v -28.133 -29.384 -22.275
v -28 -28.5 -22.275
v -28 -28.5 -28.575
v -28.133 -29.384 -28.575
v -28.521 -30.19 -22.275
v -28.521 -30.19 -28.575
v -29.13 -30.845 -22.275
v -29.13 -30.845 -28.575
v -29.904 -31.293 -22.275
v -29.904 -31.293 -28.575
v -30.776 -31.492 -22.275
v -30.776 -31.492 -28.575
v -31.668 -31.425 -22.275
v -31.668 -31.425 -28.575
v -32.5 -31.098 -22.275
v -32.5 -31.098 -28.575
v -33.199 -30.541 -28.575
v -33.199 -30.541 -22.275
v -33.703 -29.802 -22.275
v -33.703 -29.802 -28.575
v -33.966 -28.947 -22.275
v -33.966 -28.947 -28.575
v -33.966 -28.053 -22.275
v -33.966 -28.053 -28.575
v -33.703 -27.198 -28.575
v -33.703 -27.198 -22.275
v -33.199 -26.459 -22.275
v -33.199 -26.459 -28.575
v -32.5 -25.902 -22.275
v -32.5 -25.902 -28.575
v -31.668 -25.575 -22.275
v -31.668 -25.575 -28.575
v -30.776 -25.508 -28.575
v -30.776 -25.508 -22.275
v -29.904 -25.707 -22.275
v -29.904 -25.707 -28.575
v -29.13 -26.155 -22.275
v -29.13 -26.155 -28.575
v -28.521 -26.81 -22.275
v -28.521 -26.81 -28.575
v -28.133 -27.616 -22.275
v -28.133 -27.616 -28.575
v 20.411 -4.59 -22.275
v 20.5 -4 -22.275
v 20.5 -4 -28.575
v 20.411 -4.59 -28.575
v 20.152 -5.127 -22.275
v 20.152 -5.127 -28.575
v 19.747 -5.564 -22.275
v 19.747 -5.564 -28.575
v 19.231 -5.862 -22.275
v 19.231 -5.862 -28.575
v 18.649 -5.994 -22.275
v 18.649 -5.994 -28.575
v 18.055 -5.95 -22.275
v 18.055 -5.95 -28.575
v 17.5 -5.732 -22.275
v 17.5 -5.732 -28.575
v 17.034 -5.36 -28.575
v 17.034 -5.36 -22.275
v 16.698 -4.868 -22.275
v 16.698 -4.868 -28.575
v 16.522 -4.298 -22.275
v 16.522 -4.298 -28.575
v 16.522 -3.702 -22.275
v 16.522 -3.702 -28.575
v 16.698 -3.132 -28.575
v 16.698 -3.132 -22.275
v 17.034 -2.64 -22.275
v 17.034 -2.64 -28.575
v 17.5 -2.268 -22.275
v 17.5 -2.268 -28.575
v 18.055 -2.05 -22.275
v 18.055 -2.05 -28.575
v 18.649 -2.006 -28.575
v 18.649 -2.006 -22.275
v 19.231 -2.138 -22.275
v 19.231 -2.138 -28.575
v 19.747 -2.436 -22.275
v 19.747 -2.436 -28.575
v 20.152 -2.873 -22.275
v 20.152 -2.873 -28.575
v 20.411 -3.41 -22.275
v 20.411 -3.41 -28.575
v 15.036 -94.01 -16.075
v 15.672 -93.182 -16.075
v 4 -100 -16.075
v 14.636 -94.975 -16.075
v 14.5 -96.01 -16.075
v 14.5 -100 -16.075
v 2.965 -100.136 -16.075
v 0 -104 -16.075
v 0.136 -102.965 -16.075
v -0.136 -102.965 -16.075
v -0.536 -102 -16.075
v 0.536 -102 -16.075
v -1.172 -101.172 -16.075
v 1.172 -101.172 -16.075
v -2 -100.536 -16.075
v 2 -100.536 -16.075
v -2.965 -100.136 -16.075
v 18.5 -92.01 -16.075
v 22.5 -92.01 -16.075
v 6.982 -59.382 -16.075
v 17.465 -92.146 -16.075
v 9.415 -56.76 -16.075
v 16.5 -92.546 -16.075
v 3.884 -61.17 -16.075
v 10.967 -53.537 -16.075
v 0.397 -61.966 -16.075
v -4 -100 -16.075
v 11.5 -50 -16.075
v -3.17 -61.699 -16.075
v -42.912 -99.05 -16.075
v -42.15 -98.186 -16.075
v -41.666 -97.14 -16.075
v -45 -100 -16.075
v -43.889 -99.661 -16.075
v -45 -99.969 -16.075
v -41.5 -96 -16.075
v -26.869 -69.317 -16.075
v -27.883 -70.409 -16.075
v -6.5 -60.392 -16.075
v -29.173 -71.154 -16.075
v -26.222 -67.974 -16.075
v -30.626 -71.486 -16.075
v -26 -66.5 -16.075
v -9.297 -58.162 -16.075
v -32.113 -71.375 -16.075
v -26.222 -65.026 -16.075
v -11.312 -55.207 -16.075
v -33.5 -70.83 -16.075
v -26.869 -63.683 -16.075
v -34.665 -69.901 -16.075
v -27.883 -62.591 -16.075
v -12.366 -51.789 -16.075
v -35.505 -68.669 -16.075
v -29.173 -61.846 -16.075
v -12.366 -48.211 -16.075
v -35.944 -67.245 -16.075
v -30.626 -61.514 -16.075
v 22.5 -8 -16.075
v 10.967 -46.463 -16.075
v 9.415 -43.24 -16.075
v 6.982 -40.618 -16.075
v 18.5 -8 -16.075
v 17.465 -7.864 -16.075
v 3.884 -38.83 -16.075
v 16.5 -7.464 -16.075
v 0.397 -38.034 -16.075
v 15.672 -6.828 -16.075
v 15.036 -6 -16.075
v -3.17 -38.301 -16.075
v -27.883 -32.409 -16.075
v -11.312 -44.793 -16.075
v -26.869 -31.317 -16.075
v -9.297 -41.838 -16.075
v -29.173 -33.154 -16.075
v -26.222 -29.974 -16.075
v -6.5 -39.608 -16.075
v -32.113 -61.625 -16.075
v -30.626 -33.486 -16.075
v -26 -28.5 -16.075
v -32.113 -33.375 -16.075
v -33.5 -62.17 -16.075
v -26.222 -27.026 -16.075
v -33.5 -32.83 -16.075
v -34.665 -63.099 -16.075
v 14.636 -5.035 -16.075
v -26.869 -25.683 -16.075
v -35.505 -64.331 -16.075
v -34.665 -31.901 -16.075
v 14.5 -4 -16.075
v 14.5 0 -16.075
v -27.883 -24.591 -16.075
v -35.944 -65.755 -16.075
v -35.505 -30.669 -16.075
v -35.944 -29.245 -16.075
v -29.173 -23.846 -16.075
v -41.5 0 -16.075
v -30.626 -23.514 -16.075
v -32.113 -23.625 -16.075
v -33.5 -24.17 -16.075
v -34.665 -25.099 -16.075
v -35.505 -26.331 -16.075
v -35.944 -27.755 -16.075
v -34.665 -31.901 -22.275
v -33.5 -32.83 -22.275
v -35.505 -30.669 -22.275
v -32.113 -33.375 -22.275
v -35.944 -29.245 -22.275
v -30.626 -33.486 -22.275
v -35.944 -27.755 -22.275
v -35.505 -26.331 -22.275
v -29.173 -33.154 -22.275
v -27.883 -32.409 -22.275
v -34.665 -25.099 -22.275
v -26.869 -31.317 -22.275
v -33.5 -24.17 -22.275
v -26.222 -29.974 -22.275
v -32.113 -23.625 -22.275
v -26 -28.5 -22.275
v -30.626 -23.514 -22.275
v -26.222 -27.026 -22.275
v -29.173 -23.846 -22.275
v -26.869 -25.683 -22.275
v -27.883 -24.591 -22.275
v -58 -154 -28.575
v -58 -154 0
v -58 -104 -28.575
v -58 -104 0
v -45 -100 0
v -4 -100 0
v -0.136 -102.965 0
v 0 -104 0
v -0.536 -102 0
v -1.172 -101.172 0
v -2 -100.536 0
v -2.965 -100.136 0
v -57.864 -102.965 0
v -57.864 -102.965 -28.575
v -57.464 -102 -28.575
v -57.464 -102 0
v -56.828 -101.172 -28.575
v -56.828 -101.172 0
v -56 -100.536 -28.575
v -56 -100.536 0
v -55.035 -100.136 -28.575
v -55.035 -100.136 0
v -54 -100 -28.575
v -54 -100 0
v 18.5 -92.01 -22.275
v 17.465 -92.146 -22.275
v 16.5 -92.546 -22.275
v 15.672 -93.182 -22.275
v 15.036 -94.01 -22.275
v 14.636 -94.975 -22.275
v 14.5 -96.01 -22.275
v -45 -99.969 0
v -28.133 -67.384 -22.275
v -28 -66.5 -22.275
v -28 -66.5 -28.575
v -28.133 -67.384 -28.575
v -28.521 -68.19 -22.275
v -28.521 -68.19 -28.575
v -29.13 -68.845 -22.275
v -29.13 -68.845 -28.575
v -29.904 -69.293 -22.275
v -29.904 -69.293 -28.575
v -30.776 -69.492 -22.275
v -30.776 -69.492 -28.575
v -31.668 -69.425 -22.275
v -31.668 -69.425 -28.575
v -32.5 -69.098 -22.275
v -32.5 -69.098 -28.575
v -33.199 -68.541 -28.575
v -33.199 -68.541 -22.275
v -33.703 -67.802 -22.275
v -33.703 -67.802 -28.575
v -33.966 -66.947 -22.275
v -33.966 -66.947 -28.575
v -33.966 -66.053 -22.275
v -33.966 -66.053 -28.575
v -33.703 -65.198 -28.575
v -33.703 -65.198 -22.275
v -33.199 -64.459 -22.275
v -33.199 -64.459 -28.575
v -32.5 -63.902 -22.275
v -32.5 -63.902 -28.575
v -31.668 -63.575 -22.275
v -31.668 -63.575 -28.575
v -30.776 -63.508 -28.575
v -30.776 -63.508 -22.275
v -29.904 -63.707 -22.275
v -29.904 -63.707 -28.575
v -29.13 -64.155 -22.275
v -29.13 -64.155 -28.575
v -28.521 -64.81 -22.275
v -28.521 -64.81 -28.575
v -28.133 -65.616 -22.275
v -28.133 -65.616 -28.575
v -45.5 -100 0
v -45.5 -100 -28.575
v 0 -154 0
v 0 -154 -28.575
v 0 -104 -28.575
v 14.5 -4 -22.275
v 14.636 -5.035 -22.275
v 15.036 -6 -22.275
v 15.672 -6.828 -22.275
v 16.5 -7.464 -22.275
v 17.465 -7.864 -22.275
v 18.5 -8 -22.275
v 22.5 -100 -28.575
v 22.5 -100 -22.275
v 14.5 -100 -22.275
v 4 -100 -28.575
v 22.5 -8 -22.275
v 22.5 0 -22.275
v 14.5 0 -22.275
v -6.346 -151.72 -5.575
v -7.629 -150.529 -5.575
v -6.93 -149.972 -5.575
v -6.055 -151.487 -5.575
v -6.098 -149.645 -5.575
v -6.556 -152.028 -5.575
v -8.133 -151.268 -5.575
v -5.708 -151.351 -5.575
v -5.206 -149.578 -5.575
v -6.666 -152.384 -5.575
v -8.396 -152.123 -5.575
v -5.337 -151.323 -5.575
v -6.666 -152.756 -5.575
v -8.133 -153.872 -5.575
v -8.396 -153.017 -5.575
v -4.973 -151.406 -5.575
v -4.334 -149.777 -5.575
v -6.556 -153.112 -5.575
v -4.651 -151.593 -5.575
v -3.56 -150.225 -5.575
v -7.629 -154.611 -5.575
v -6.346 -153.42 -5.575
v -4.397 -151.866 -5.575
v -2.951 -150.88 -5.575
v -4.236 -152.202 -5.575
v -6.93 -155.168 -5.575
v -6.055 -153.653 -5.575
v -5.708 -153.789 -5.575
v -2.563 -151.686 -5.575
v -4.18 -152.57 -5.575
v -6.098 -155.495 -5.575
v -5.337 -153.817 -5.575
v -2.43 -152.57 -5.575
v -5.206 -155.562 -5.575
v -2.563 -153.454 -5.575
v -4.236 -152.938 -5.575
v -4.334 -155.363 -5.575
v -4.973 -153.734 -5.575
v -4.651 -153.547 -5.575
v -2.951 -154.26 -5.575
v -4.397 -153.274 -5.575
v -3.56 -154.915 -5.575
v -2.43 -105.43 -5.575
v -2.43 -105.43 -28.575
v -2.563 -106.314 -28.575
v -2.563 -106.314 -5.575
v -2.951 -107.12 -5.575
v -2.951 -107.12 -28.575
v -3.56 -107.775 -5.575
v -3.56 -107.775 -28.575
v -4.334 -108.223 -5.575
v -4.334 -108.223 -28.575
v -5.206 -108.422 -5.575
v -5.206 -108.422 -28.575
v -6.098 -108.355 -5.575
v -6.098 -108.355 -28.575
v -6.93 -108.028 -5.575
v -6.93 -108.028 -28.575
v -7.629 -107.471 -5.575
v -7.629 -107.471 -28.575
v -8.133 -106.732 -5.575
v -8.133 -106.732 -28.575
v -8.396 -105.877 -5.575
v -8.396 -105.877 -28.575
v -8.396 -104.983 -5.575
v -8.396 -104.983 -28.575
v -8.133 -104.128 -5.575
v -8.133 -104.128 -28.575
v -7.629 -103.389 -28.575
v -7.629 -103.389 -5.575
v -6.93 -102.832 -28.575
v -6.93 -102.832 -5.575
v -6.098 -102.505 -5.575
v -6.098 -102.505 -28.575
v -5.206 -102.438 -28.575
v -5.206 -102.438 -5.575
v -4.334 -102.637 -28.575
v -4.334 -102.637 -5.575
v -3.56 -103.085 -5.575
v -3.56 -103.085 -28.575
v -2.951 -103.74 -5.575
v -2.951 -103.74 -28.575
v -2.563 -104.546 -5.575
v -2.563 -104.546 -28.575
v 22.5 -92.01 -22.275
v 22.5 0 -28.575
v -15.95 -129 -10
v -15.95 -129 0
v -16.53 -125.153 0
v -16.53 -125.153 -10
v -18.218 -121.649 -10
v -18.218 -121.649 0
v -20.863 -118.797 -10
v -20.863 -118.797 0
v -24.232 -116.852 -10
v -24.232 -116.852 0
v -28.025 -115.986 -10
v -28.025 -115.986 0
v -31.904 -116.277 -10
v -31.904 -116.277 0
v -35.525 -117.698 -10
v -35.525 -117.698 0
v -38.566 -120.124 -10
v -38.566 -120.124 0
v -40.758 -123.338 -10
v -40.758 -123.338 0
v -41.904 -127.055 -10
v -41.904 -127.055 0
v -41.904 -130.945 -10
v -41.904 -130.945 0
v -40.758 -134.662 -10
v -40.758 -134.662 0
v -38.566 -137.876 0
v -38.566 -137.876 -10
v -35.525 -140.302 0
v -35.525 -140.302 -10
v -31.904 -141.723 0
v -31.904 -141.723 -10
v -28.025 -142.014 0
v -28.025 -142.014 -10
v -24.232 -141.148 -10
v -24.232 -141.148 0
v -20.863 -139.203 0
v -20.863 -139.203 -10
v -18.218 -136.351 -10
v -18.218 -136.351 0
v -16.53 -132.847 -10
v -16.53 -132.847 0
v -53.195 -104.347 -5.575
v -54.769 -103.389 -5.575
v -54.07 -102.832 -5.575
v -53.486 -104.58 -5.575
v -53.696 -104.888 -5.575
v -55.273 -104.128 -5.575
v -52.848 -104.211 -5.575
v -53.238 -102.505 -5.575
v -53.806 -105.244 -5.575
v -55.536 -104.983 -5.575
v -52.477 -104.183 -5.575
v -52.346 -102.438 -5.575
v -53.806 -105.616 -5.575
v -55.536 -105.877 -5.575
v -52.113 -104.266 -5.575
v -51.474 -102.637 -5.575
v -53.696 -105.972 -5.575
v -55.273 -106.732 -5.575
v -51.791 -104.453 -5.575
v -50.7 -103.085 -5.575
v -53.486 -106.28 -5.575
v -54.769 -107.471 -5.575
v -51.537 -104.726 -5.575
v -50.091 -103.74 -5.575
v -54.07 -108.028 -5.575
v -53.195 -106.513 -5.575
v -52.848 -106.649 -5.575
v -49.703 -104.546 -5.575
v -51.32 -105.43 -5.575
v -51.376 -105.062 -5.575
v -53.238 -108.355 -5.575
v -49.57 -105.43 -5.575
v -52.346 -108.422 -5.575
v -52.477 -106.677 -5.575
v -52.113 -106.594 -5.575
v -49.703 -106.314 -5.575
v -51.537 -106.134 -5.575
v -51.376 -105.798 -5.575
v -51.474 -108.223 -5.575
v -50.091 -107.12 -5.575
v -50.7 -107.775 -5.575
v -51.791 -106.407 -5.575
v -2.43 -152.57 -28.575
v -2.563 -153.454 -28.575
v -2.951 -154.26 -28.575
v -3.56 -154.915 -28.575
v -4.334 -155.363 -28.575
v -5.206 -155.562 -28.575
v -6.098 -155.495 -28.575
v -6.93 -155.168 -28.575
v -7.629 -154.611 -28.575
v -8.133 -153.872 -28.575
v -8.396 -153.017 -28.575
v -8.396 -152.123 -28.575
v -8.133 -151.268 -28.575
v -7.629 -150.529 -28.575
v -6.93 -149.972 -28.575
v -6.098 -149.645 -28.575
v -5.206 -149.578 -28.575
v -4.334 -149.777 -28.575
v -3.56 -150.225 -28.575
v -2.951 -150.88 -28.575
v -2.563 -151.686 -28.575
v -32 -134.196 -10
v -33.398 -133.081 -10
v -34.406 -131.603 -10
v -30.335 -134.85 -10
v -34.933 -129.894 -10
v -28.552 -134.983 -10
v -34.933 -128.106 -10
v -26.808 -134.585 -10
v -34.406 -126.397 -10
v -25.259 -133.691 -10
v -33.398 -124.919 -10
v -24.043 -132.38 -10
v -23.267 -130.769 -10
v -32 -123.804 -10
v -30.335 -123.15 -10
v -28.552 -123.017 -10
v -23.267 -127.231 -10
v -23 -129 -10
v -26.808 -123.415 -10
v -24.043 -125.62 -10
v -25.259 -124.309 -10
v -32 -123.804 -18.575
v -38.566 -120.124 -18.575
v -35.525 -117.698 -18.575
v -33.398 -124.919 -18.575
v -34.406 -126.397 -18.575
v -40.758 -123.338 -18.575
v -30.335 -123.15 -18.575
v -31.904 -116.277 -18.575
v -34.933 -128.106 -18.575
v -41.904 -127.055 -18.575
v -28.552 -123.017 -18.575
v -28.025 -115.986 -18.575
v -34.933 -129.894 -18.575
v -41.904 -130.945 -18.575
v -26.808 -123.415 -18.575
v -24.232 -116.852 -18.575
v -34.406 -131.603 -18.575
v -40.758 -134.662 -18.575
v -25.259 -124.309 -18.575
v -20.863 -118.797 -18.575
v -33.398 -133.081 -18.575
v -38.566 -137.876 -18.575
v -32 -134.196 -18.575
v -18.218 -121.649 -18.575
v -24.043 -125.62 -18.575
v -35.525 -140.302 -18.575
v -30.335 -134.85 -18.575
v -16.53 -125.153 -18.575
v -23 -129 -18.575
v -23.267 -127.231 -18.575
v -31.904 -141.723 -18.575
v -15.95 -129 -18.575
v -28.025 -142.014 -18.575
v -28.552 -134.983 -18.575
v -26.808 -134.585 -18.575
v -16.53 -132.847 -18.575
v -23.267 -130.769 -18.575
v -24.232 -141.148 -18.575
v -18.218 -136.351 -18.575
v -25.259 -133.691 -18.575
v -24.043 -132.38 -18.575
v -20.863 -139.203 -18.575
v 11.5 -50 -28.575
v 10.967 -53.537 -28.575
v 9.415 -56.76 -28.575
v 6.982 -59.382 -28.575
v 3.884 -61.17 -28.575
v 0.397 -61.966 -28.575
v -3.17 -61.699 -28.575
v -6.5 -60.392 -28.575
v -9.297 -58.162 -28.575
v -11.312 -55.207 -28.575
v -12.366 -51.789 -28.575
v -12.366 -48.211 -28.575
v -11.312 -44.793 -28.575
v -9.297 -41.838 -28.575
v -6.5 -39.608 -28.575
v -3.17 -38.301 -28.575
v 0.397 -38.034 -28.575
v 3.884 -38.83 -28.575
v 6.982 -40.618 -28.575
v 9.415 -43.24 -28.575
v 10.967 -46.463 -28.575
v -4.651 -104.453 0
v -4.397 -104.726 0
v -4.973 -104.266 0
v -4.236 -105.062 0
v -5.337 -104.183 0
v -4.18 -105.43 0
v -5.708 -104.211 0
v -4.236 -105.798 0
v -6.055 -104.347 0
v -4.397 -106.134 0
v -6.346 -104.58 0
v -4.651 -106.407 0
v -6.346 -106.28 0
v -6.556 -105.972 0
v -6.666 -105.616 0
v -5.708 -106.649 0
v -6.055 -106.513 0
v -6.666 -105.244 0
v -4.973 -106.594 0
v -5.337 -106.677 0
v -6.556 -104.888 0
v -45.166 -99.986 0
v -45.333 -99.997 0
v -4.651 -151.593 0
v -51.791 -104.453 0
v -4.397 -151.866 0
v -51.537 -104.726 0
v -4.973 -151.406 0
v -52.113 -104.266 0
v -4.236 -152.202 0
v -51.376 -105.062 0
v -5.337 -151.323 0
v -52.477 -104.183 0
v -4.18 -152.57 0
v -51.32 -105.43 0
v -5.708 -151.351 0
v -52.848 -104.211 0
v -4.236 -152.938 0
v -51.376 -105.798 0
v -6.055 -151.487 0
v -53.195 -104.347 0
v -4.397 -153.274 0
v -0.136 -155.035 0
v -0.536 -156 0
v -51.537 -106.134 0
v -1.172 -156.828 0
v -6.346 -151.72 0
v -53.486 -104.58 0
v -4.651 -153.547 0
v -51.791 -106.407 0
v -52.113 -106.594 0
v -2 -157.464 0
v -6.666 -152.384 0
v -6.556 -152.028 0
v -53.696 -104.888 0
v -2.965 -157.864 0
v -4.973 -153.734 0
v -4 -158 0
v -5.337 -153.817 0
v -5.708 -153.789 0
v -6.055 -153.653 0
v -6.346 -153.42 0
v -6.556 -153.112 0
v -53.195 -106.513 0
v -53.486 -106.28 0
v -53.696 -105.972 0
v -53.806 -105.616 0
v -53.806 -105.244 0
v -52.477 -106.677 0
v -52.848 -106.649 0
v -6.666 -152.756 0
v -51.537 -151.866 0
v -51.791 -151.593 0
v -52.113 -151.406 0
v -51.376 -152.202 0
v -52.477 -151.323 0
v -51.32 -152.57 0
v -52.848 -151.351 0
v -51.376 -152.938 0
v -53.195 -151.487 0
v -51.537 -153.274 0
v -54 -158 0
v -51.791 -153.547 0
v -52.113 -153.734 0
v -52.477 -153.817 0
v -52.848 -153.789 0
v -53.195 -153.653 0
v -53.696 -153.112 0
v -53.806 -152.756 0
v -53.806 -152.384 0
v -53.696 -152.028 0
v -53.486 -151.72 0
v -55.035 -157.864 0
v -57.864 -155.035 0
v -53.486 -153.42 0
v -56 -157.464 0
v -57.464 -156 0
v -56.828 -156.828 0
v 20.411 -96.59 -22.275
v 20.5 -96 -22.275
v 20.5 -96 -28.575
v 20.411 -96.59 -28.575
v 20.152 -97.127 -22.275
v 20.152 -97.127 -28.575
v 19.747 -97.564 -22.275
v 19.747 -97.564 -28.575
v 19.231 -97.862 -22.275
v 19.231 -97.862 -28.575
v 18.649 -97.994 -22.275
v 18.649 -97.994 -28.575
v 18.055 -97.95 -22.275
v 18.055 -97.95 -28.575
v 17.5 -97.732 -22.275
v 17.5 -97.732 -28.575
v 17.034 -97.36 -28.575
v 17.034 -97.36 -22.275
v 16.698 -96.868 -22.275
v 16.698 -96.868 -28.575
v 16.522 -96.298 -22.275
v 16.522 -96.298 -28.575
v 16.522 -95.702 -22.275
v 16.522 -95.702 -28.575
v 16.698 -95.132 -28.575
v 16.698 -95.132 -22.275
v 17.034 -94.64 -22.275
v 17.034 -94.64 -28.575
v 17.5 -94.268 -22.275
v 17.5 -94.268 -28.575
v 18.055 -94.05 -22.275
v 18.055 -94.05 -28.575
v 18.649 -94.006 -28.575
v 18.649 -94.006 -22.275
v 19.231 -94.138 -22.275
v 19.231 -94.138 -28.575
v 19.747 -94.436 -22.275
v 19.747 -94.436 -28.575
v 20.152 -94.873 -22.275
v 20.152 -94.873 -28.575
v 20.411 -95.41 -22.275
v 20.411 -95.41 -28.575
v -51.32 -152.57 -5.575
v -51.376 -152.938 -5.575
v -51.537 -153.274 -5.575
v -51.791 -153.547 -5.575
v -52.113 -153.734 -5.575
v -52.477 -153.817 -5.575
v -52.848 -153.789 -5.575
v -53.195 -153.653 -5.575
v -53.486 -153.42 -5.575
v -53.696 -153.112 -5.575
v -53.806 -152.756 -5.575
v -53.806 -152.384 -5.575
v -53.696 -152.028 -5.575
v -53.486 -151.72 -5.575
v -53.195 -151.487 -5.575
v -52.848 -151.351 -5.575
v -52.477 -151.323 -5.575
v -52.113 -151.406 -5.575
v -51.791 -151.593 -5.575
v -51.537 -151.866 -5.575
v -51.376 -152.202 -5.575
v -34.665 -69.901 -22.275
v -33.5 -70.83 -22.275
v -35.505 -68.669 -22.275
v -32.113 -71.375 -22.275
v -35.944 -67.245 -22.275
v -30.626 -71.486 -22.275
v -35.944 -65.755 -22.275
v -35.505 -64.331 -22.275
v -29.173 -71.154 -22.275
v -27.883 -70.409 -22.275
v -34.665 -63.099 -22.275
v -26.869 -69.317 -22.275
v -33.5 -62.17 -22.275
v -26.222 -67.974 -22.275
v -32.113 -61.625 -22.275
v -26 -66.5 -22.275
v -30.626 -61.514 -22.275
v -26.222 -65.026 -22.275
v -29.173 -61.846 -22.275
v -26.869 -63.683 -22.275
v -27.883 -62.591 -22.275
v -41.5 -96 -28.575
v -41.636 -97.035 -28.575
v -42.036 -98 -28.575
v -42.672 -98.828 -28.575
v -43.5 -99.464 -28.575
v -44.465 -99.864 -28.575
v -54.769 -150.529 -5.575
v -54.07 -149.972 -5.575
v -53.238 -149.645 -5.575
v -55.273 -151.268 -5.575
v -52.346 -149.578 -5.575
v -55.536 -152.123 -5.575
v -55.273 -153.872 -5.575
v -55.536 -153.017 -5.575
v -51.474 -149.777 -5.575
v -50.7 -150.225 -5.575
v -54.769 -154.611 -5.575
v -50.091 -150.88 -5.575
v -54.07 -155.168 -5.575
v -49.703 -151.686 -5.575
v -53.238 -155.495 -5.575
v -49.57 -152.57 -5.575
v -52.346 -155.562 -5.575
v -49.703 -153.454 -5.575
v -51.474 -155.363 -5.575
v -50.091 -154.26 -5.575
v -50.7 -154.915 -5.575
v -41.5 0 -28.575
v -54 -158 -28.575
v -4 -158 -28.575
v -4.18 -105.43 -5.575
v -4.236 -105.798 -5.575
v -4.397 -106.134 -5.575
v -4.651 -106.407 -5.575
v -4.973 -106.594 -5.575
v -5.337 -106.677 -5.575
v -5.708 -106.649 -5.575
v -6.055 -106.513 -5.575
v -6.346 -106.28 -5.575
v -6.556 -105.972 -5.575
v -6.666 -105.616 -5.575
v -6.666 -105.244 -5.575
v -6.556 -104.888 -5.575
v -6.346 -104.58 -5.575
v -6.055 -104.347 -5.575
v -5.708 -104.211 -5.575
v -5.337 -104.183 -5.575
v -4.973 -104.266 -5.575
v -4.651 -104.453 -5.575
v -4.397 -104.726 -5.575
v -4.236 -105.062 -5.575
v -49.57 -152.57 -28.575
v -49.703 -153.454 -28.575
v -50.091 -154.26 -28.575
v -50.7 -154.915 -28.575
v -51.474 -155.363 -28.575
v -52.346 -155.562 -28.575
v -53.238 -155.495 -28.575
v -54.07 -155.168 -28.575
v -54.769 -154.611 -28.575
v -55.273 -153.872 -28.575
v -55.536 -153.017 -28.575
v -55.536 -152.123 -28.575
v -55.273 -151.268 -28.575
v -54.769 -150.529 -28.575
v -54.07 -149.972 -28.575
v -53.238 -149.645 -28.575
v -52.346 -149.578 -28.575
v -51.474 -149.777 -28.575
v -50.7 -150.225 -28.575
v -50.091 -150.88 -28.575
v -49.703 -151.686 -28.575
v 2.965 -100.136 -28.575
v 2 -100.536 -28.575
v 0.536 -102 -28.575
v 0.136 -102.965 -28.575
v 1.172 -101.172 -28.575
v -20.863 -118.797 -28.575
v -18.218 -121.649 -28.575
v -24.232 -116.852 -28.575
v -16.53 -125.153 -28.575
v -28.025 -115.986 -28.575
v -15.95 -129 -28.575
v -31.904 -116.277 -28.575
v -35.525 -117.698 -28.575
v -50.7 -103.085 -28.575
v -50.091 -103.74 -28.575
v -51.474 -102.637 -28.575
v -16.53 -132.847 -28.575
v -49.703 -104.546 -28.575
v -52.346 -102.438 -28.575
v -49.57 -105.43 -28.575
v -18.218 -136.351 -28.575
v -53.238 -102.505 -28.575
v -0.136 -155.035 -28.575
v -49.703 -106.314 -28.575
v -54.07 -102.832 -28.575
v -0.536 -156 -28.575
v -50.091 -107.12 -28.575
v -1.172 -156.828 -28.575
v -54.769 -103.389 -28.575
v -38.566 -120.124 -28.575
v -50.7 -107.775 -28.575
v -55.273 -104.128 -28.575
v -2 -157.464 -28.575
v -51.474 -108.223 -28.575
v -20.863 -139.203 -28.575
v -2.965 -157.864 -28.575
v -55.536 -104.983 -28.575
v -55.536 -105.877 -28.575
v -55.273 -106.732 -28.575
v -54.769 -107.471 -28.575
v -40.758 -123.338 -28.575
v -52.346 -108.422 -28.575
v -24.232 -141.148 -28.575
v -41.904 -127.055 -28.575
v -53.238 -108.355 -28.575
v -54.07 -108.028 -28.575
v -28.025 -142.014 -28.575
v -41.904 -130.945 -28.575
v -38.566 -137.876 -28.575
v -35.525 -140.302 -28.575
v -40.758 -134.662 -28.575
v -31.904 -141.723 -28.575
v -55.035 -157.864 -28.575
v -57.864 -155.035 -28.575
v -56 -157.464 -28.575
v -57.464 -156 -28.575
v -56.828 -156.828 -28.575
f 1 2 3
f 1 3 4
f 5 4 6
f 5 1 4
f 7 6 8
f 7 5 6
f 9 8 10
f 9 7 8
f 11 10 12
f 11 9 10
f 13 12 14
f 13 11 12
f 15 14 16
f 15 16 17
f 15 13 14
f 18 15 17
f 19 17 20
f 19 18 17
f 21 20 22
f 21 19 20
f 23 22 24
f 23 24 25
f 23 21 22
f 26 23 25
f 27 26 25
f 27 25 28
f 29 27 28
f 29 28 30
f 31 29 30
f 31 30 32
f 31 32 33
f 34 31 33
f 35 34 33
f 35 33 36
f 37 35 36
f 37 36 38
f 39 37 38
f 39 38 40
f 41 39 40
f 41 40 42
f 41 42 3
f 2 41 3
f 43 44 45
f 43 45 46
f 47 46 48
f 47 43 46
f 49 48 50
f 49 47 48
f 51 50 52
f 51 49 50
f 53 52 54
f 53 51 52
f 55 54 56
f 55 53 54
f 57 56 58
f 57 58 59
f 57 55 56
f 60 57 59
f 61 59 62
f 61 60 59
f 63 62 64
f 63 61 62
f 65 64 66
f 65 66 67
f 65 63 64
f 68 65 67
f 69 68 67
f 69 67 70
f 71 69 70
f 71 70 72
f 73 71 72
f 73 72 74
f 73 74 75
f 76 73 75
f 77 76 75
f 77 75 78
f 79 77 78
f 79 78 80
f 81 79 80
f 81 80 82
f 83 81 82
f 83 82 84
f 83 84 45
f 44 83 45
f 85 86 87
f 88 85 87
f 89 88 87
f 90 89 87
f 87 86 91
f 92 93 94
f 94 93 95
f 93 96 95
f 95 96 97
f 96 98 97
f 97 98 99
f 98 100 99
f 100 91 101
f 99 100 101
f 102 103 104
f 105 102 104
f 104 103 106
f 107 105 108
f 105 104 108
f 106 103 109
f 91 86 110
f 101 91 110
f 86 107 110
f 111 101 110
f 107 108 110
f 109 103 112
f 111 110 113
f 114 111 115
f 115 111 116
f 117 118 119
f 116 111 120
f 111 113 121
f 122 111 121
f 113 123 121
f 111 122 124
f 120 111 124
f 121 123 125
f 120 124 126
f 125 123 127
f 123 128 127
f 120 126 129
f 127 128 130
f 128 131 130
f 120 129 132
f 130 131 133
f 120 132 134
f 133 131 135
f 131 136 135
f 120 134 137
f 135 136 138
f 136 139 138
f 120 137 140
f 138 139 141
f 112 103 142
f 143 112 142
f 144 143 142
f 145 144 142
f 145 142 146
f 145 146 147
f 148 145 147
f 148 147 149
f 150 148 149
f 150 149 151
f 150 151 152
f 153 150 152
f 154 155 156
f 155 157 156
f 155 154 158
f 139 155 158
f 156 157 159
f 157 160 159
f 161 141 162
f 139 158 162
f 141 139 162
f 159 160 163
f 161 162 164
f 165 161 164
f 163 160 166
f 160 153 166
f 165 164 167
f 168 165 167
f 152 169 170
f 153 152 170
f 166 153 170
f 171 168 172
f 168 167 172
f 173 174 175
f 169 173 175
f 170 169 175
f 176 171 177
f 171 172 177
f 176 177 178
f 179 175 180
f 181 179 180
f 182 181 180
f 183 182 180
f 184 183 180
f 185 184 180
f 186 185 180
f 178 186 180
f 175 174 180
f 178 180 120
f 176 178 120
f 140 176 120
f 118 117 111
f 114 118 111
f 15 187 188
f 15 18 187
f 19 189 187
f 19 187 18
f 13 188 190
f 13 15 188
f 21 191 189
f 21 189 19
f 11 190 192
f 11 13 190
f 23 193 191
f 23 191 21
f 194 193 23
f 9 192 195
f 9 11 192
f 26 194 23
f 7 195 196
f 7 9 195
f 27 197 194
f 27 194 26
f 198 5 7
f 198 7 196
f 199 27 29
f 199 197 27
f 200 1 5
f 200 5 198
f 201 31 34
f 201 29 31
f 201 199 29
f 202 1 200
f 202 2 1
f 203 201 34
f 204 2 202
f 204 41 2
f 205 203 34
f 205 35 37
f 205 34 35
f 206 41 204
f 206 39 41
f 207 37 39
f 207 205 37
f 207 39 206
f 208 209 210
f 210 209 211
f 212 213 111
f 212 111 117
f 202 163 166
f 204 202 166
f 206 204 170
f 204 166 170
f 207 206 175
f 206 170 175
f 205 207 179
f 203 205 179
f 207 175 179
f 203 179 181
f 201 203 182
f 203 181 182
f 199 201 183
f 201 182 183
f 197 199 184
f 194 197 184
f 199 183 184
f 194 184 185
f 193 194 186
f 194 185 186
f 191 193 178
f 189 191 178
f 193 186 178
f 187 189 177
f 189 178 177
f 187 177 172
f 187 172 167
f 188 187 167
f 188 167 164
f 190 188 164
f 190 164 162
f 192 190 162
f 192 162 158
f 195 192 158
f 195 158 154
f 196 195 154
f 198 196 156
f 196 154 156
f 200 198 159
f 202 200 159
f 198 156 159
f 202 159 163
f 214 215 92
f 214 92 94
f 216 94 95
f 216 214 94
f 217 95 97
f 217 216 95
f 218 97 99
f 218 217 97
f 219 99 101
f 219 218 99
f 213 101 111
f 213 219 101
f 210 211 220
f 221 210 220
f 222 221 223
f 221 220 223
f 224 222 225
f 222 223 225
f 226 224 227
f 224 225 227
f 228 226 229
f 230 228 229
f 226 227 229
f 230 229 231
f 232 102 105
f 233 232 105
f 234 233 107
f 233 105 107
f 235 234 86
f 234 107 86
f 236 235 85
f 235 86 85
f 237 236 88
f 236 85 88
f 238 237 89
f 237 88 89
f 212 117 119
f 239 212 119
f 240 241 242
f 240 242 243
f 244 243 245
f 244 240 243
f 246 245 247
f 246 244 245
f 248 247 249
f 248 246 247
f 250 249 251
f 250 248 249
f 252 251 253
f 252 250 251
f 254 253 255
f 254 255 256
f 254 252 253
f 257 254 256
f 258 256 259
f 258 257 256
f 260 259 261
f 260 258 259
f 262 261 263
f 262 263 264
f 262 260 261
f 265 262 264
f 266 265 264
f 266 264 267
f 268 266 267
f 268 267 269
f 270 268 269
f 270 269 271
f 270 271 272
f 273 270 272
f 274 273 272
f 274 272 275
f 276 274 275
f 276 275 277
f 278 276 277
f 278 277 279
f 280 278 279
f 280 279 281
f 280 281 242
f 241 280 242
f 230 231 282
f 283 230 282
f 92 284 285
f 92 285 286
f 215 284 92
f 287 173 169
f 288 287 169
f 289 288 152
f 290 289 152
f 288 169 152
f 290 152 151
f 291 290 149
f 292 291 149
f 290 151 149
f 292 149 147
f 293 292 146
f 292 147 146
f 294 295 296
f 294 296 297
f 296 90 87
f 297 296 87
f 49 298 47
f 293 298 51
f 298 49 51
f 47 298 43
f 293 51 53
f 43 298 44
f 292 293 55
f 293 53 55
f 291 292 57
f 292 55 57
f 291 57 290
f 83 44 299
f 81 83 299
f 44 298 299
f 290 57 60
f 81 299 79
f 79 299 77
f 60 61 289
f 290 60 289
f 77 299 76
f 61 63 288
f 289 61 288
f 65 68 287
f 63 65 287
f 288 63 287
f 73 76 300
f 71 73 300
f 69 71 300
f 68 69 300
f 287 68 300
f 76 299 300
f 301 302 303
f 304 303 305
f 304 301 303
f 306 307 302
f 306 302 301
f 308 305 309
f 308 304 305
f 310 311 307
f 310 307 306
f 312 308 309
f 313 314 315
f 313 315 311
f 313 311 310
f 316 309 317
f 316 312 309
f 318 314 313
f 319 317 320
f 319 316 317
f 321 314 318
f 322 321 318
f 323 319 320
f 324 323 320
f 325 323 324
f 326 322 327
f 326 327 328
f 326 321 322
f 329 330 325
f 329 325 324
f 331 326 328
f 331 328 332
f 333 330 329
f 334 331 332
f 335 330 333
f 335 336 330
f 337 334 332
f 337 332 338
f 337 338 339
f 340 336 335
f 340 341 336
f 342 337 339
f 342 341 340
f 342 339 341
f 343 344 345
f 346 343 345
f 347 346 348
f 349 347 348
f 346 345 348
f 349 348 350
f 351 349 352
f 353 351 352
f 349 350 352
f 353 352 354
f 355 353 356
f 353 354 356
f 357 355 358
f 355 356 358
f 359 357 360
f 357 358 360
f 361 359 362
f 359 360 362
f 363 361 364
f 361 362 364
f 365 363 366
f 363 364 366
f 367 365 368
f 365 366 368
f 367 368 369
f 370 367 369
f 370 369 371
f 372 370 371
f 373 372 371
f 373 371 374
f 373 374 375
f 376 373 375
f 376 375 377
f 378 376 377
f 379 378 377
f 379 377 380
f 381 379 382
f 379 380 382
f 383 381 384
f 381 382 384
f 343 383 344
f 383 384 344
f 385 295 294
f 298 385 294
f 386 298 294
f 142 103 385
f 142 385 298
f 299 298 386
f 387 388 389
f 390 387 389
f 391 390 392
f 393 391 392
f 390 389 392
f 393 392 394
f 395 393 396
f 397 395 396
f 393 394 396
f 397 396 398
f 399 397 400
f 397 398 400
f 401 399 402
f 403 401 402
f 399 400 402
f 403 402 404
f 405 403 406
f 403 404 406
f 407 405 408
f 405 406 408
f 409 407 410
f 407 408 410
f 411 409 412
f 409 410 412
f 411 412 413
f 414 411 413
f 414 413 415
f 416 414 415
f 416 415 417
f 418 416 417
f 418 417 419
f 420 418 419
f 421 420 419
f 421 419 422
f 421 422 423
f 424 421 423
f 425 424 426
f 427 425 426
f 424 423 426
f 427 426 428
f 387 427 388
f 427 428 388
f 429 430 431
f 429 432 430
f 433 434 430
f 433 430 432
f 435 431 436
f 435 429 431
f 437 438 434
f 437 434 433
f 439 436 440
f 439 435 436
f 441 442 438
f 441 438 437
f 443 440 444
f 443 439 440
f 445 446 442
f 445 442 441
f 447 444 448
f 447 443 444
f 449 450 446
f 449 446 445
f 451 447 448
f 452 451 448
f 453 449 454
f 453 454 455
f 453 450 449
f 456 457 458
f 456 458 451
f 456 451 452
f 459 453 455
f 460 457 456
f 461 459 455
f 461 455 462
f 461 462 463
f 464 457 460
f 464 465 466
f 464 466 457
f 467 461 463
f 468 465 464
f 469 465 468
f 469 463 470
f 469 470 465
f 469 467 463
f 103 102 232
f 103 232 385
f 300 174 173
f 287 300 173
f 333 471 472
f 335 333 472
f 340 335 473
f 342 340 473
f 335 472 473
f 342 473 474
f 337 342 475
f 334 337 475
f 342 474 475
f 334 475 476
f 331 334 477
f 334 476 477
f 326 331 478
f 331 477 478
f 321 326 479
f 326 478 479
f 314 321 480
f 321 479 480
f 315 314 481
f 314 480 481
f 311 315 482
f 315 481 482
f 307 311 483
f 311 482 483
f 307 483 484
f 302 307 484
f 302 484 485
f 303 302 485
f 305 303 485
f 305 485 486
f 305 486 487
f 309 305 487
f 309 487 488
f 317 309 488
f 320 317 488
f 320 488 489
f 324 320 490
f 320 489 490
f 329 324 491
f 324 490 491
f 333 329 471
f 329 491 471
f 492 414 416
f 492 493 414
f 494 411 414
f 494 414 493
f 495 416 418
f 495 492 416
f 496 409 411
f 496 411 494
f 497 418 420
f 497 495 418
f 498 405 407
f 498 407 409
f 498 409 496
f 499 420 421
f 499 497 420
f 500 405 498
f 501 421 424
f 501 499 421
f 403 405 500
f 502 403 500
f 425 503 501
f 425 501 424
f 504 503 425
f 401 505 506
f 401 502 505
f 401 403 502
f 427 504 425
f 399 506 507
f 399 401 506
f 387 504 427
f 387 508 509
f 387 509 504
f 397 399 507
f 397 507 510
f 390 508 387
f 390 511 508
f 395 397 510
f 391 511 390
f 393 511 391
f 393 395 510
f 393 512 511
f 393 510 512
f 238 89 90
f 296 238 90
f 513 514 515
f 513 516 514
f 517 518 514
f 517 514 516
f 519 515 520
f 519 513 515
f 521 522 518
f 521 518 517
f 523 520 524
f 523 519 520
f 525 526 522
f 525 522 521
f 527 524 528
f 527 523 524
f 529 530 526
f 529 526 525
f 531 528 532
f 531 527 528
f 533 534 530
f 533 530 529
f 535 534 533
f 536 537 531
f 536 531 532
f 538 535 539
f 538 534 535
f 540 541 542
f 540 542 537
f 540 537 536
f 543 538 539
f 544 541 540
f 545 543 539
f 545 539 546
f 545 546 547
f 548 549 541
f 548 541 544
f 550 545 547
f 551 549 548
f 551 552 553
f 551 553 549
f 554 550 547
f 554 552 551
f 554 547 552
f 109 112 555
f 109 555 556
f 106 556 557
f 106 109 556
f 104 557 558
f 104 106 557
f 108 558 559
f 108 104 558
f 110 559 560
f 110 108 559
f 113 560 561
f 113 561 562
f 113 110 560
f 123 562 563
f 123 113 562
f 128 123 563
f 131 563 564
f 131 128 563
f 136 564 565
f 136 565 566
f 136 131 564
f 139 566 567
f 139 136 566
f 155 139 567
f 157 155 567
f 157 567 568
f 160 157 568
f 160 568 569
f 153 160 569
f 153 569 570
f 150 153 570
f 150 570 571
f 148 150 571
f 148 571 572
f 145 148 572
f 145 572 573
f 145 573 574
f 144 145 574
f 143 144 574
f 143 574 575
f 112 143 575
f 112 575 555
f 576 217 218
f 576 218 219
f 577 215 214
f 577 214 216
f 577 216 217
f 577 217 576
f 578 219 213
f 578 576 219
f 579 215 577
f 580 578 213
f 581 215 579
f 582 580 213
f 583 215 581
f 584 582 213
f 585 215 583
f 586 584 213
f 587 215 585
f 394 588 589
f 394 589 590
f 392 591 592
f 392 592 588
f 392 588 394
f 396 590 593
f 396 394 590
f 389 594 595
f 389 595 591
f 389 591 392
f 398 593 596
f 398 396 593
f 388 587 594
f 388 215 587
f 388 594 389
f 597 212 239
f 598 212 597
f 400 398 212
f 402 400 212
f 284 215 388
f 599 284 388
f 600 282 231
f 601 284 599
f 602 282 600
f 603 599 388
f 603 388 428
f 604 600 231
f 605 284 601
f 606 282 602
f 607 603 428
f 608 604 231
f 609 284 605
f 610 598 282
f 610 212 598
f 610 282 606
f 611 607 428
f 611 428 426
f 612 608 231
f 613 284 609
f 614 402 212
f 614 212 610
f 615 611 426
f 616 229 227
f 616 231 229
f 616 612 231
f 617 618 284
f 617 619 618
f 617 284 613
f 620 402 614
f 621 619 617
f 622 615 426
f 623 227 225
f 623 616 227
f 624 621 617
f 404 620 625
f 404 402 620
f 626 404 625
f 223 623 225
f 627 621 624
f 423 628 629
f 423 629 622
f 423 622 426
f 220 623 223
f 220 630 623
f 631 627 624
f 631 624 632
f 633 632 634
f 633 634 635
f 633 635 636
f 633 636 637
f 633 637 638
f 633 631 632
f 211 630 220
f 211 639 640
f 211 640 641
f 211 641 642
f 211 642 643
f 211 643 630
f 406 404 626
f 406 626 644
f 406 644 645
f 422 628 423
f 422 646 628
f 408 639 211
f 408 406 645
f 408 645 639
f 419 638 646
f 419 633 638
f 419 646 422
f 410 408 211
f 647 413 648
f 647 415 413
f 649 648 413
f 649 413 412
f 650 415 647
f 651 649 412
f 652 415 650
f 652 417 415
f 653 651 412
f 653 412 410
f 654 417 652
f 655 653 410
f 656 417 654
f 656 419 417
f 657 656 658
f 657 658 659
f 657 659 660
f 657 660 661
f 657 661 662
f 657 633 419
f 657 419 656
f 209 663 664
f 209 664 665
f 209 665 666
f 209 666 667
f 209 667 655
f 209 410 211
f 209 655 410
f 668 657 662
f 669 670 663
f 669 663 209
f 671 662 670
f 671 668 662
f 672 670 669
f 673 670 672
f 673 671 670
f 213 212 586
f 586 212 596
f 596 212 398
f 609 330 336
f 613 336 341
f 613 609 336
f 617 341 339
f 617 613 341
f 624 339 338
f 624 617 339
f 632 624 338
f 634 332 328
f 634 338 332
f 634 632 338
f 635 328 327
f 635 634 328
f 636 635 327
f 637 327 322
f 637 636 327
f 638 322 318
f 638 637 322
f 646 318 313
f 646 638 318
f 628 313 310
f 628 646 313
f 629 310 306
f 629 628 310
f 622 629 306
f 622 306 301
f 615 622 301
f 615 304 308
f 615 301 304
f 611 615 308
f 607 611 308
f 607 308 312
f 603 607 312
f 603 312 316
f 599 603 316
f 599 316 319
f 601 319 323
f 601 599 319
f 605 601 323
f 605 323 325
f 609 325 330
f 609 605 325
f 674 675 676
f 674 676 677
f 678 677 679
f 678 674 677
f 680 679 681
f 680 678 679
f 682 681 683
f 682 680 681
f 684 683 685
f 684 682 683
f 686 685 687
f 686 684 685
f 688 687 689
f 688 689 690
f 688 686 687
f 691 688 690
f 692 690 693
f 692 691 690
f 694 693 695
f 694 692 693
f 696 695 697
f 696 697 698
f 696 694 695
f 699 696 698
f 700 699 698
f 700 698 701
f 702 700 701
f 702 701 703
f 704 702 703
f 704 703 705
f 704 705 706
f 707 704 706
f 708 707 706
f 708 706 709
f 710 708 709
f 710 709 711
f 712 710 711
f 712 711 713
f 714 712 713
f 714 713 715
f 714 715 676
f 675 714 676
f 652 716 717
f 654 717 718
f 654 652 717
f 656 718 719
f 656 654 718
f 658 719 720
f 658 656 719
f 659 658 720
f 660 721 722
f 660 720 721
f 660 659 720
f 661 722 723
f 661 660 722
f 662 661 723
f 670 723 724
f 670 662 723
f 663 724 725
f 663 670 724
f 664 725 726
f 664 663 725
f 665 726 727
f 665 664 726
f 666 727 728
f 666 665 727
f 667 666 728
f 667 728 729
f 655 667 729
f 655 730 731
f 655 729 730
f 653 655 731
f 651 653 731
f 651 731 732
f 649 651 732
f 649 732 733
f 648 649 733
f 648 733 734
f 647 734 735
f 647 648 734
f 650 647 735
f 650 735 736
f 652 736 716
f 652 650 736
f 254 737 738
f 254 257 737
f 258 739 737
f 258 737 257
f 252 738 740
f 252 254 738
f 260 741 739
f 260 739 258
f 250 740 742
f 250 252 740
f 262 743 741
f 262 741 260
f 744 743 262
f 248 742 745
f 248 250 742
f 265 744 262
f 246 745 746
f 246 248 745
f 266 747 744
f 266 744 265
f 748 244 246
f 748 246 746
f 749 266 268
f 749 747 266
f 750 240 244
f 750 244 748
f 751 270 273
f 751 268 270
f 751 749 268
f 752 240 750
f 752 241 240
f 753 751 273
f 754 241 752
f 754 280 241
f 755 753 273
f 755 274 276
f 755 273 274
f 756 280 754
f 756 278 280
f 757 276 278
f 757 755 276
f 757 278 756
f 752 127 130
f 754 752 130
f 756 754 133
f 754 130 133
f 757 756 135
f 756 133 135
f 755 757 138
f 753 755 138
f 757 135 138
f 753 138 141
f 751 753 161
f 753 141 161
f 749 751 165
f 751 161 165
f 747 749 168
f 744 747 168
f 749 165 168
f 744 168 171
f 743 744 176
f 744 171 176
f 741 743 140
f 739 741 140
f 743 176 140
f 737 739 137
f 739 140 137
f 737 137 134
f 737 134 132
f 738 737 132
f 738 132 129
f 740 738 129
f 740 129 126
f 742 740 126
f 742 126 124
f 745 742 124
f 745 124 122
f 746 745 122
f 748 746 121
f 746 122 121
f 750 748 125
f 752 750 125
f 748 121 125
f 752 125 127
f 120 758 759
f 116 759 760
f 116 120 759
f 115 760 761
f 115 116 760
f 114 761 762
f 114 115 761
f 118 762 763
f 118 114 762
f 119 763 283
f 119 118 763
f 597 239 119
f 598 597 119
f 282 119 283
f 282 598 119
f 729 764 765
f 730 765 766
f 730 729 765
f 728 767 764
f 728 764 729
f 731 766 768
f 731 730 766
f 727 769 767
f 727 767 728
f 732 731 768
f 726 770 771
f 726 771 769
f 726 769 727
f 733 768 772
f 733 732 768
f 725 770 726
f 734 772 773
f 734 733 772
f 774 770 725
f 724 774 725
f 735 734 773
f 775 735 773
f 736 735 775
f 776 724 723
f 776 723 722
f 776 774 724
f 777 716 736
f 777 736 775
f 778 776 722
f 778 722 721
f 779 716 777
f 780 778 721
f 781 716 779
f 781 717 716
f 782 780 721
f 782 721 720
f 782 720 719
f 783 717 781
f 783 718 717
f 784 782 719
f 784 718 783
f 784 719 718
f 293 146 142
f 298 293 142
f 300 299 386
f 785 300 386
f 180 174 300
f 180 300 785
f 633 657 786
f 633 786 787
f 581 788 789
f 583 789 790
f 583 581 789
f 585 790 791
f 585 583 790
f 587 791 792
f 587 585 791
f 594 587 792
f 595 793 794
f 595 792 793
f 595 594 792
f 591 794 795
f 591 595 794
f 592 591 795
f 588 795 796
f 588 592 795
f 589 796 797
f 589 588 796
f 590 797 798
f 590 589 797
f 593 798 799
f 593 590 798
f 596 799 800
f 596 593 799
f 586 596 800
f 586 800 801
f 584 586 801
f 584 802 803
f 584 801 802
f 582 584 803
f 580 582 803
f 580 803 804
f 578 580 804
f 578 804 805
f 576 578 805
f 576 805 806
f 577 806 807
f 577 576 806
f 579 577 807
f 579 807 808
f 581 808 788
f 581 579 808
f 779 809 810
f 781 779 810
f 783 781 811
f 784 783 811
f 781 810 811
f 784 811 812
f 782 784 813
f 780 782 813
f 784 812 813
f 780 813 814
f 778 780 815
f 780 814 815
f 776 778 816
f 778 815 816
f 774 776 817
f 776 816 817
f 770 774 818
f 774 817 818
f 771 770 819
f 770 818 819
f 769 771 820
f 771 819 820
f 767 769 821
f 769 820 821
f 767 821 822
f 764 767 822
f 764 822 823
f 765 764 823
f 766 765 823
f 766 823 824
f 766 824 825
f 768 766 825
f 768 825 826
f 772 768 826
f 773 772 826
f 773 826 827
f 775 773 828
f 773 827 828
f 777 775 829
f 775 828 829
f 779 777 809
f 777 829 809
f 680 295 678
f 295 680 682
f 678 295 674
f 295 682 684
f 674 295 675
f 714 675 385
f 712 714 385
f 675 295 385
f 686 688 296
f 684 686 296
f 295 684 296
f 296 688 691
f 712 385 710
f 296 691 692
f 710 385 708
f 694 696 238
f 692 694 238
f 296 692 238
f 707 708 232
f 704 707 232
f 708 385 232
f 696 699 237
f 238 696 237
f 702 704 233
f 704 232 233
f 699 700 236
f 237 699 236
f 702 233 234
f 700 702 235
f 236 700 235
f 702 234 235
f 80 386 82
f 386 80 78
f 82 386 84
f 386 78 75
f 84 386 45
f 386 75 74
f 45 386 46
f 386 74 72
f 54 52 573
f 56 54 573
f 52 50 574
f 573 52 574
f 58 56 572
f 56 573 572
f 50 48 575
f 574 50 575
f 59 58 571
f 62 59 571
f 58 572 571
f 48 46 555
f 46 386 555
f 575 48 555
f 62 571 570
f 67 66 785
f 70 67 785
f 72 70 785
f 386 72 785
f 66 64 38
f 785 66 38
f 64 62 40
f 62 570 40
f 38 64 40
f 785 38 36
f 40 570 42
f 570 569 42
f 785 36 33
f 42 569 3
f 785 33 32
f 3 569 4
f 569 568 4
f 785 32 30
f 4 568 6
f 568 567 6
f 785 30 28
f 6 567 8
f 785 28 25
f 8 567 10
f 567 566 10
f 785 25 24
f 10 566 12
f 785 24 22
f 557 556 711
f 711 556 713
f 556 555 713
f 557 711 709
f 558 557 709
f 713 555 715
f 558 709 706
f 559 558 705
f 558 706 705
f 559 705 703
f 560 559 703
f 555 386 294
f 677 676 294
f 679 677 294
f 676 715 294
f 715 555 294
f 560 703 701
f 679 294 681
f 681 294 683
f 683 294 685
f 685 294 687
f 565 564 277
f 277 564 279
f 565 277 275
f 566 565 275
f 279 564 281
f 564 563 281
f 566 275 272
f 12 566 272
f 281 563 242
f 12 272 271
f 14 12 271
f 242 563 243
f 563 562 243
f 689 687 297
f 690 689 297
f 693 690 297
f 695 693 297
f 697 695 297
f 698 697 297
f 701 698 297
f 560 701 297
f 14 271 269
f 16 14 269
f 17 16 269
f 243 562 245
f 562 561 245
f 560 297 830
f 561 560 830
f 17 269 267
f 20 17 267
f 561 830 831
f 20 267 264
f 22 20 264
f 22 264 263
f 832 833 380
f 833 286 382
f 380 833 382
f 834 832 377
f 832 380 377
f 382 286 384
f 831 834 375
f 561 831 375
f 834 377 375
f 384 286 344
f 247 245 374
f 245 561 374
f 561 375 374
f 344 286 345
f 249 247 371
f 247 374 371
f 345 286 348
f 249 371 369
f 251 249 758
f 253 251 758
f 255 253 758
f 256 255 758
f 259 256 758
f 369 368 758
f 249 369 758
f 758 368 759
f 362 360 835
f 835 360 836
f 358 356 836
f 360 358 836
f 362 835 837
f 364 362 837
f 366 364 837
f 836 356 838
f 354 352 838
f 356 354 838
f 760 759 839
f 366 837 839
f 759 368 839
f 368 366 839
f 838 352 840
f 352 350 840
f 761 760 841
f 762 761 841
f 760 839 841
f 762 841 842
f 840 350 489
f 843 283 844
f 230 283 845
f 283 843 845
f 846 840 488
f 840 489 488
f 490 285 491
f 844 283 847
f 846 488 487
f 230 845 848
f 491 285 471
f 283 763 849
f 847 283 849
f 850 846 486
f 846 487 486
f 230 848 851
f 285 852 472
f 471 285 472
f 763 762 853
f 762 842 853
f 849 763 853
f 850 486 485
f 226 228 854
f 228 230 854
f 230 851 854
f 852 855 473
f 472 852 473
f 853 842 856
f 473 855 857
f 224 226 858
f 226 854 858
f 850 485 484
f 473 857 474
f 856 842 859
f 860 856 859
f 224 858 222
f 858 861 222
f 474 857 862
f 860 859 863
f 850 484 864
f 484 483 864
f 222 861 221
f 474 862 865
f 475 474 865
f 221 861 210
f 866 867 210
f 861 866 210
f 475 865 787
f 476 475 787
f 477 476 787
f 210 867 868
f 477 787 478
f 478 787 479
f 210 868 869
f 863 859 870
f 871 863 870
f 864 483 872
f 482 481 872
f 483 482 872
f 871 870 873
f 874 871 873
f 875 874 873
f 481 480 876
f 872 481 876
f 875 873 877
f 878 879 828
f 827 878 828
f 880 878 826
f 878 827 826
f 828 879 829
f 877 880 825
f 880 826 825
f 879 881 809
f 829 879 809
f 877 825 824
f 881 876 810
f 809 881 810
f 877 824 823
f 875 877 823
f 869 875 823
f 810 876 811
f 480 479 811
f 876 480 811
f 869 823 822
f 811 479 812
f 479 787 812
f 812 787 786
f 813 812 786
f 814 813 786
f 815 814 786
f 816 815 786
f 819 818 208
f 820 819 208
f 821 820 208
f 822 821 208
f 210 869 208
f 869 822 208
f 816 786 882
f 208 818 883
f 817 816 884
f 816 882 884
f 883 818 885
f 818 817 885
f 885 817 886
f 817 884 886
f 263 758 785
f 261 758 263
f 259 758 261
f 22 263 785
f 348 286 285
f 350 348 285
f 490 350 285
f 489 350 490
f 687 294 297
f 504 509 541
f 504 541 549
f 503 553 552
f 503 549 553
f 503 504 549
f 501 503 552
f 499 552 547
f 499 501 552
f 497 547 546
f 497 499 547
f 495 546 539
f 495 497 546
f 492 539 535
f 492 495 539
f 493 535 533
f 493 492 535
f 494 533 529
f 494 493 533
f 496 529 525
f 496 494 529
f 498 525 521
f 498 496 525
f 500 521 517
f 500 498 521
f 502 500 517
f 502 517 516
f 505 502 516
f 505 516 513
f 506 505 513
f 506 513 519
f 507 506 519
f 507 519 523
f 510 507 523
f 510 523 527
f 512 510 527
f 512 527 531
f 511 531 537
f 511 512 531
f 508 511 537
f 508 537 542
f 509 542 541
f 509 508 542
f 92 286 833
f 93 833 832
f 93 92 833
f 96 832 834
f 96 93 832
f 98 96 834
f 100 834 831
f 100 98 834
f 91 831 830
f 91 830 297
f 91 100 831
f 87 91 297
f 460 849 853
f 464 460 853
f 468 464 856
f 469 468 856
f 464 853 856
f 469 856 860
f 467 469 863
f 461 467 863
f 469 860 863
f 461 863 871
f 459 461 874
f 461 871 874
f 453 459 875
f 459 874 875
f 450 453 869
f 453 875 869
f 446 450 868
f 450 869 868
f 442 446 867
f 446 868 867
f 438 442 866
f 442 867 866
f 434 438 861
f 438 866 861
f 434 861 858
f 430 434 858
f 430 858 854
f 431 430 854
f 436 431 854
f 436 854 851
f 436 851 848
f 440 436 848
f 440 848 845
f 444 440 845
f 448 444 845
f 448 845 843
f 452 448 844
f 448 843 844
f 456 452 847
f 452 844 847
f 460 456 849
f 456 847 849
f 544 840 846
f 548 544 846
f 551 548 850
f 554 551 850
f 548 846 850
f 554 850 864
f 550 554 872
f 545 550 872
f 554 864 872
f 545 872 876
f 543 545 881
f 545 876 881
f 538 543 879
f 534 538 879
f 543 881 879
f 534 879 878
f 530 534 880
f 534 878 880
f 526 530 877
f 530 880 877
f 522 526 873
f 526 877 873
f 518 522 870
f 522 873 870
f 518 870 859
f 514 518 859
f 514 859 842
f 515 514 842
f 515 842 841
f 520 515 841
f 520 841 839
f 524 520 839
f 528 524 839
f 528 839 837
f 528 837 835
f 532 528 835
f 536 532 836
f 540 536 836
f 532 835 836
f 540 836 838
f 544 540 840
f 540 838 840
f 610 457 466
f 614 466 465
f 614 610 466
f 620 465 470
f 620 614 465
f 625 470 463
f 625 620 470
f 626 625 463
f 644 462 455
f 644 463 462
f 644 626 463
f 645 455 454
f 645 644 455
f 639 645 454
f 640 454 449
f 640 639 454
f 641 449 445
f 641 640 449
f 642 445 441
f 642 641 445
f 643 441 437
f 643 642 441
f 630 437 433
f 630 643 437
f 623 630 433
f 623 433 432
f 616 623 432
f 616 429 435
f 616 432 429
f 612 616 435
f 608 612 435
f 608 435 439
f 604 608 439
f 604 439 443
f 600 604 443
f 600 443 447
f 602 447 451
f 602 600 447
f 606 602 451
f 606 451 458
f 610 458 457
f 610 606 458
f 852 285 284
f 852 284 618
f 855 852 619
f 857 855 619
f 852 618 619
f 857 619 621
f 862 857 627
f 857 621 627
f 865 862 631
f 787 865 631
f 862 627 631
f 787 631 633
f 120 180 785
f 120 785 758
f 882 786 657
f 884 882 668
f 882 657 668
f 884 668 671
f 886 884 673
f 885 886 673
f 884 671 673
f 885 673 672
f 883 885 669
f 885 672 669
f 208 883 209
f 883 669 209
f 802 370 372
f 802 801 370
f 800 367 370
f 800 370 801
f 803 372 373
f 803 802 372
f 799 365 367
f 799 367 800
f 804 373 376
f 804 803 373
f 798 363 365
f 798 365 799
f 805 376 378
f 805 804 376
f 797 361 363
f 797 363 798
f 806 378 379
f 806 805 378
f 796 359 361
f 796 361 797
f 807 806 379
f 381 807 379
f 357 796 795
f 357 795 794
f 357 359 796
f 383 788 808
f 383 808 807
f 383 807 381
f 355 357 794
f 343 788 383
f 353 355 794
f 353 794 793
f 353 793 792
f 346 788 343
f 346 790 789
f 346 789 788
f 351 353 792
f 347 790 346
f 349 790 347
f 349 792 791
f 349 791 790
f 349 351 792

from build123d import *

# Parameters (mm, degrees)
SKETCH002_R     = 6
SKETCH002_R_2   = 3
SKETCH002_R_3   = 1.25
SKETCH002_R_4   = 2
SKETCH002_R_5   = 12
PAD_DEPTH       = 28.575
POCKET_DEPTH    = 16.075
SKETCH_R        = 13.05
POCKET001_DEPTH = 10
SKETCH005_R     = 13.05
POCKET002_DEPTH = 10
SKETCH006_R     = 3
POCKET003_DEPTH = 23
SKETCH007_R     = 5
POCKET004_DEPTH = 6.2


with BuildPart() as part:
    # Sketch002 → Pad (new body)
    with BuildSketch(Plane(origin=(0, 0, 0), x_dir=(1, 0, 0), z_dir=(0, 0, -1))):
        with BuildLine():
            Line((22.5, 0), (-41.5, 0))
            Line((-41.5, 0), (-41.5, 96))
            ThreePointArc((-41.5, 96), (-42.671582, 98.828436), (-45.500026, 100))
            Line((-53.999998, 100), (-45.500026, 100))
            ThreePointArc((-58, 104), (-56.828427, 101.171573), (-53.999998, 100))
            Line((-58, 154), (-58, 104))
            ThreePointArc((-53.999999, 158), (-56.828427, 156.828427), (-58, 154))
            Line((-53.999999, 158), (-4, 158))
            ThreePointArc((0, 154), (-1.171573, 156.828427), (-4, 158))
            Line((0, 154), (0, 104.000001))
            ThreePointArc((0, 104.000001), (1.171573, 101.171574), (4, 100.000001))
            Line((22.5, 100.000001), (4, 100.000001))
            Line((22.5, 100.000001), (22.5, 0))
        make_face()
        with Locations((-29, 129)):
            Circle(SKETCH002_R, mode=Mode.SUBTRACT)
        with Locations((-31, 66.5)):
            Circle(SKETCH002_R_2, mode=Mode.SUBTRACT)
        with Locations((-31, 28.5)):
            Circle(SKETCH002_R_2, mode=Mode.SUBTRACT)
        with Locations((-5.43, 152.57)):
            Circle(SKETCH002_R_3, mode=Mode.SUBTRACT)
        with Locations((-52.57, 152.57)):
            Circle(SKETCH002_R_3, mode=Mode.SUBTRACT)
        with Locations((-52.57, 105.43)):
            Circle(SKETCH002_R_3, mode=Mode.SUBTRACT)
        with Locations((-5.43, 105.43)):
            Circle(SKETCH002_R_3, mode=Mode.SUBTRACT)
        with Locations((18.5, 96.000001)):
            Circle(SKETCH002_R_4, mode=Mode.SUBTRACT)
        with Locations((18.5, 4)):
            Circle(SKETCH002_R_4, mode=Mode.SUBTRACT)
        with Locations((-0.5, 50)):
            Circle(SKETCH002_R_5, mode=Mode.SUBTRACT)
    extrude(amount=PAD_DEPTH)

    # Sketch004 → Pocket (cut)
    with BuildSketch(Plane.XY):
        with BuildLine():
            Line((-45, 0), (24, 0))
            Line((24, 0), (24, -104.00002))
            Line((24, -104.00002), (0, -104.00002))
            ThreePointArc((0, -104.00002), (-1.171559, -101.171587), (-3.99998, -100))
            Line((-3.99998, -100), (-45, -100))
            Line((-45, -100), (-45, 0))
        make_face()
    extrude(amount=-POCKET_DEPTH, mode=Mode.SUBTRACT)

    # Sketch → Pocket001 (cut)
    with BuildSketch(Plane(origin=(0, 0, -28.575), x_dir=(1, 0, 0), z_dir=(0, 0, -1))):
        with Locations((-29, 129)):
            Circle(SKETCH_R)
    extrude(amount=-POCKET001_DEPTH, mode=Mode.SUBTRACT)

    # Sketch005 → Pocket002 (cut)
    with BuildSketch(Plane.XY):
        with Locations((-29, -129)):
            Circle(SKETCH005_R)
    extrude(amount=-POCKET002_DEPTH, mode=Mode.SUBTRACT)

    # Sketch006 → Pocket003 (cut)
    with BuildSketch(Plane(origin=(0, 0, -28.575), x_dir=(1, 0, 0), z_dir=(0, 0, -1))):
        with Locations((-52.57, 152.57)):
            Circle(SKETCH006_R)
        with Locations((-5.43, 152.57)):
            Circle(SKETCH006_R)
        with Locations((-52.57, 105.43)):
            Circle(SKETCH006_R)
        with Locations((-5.43, 105.43)):
            Circle(SKETCH006_R)
    extrude(amount=-POCKET003_DEPTH, mode=Mode.SUBTRACT)

    # Sketch007 → Pocket004 (cut)
    with BuildSketch(Plane.XY.offset(-16.075)):
        with Locations((-31, -28.5)):
            Circle(SKETCH007_R)
        with Locations((-31, -66.5)):
            Circle(SKETCH007_R)
        with BuildLine():
            Line((14.5, 0), (22.5, 0))
            Line((22.5, 0), (22.5, -8))
            Line((18.500001, -8), (22.5, -8))
            ThreePointArc((14.5, -4), (15.671573, -6.828428), (18.500001, -8))
            Line((14.5, 0), (14.5, -4))
        make_face()
        with BuildLine():
            Line((22.5, -92.01), (22.5, -100.01))
            Line((22.5, -100.01), (14.5, -100.01))
            Line((14.5, -96.01), (14.5, -100.01))
            ThreePointArc((18.499999, -92.01), (15.671573, -93.181573), (14.5, -96.01))
            Line((18.499999, -92.01), (22.5, -92.01))
        make_face()
    extrude(amount=-POCKET004_DEPTH, mode=Mode.SUBTRACT)


solid = part.part
